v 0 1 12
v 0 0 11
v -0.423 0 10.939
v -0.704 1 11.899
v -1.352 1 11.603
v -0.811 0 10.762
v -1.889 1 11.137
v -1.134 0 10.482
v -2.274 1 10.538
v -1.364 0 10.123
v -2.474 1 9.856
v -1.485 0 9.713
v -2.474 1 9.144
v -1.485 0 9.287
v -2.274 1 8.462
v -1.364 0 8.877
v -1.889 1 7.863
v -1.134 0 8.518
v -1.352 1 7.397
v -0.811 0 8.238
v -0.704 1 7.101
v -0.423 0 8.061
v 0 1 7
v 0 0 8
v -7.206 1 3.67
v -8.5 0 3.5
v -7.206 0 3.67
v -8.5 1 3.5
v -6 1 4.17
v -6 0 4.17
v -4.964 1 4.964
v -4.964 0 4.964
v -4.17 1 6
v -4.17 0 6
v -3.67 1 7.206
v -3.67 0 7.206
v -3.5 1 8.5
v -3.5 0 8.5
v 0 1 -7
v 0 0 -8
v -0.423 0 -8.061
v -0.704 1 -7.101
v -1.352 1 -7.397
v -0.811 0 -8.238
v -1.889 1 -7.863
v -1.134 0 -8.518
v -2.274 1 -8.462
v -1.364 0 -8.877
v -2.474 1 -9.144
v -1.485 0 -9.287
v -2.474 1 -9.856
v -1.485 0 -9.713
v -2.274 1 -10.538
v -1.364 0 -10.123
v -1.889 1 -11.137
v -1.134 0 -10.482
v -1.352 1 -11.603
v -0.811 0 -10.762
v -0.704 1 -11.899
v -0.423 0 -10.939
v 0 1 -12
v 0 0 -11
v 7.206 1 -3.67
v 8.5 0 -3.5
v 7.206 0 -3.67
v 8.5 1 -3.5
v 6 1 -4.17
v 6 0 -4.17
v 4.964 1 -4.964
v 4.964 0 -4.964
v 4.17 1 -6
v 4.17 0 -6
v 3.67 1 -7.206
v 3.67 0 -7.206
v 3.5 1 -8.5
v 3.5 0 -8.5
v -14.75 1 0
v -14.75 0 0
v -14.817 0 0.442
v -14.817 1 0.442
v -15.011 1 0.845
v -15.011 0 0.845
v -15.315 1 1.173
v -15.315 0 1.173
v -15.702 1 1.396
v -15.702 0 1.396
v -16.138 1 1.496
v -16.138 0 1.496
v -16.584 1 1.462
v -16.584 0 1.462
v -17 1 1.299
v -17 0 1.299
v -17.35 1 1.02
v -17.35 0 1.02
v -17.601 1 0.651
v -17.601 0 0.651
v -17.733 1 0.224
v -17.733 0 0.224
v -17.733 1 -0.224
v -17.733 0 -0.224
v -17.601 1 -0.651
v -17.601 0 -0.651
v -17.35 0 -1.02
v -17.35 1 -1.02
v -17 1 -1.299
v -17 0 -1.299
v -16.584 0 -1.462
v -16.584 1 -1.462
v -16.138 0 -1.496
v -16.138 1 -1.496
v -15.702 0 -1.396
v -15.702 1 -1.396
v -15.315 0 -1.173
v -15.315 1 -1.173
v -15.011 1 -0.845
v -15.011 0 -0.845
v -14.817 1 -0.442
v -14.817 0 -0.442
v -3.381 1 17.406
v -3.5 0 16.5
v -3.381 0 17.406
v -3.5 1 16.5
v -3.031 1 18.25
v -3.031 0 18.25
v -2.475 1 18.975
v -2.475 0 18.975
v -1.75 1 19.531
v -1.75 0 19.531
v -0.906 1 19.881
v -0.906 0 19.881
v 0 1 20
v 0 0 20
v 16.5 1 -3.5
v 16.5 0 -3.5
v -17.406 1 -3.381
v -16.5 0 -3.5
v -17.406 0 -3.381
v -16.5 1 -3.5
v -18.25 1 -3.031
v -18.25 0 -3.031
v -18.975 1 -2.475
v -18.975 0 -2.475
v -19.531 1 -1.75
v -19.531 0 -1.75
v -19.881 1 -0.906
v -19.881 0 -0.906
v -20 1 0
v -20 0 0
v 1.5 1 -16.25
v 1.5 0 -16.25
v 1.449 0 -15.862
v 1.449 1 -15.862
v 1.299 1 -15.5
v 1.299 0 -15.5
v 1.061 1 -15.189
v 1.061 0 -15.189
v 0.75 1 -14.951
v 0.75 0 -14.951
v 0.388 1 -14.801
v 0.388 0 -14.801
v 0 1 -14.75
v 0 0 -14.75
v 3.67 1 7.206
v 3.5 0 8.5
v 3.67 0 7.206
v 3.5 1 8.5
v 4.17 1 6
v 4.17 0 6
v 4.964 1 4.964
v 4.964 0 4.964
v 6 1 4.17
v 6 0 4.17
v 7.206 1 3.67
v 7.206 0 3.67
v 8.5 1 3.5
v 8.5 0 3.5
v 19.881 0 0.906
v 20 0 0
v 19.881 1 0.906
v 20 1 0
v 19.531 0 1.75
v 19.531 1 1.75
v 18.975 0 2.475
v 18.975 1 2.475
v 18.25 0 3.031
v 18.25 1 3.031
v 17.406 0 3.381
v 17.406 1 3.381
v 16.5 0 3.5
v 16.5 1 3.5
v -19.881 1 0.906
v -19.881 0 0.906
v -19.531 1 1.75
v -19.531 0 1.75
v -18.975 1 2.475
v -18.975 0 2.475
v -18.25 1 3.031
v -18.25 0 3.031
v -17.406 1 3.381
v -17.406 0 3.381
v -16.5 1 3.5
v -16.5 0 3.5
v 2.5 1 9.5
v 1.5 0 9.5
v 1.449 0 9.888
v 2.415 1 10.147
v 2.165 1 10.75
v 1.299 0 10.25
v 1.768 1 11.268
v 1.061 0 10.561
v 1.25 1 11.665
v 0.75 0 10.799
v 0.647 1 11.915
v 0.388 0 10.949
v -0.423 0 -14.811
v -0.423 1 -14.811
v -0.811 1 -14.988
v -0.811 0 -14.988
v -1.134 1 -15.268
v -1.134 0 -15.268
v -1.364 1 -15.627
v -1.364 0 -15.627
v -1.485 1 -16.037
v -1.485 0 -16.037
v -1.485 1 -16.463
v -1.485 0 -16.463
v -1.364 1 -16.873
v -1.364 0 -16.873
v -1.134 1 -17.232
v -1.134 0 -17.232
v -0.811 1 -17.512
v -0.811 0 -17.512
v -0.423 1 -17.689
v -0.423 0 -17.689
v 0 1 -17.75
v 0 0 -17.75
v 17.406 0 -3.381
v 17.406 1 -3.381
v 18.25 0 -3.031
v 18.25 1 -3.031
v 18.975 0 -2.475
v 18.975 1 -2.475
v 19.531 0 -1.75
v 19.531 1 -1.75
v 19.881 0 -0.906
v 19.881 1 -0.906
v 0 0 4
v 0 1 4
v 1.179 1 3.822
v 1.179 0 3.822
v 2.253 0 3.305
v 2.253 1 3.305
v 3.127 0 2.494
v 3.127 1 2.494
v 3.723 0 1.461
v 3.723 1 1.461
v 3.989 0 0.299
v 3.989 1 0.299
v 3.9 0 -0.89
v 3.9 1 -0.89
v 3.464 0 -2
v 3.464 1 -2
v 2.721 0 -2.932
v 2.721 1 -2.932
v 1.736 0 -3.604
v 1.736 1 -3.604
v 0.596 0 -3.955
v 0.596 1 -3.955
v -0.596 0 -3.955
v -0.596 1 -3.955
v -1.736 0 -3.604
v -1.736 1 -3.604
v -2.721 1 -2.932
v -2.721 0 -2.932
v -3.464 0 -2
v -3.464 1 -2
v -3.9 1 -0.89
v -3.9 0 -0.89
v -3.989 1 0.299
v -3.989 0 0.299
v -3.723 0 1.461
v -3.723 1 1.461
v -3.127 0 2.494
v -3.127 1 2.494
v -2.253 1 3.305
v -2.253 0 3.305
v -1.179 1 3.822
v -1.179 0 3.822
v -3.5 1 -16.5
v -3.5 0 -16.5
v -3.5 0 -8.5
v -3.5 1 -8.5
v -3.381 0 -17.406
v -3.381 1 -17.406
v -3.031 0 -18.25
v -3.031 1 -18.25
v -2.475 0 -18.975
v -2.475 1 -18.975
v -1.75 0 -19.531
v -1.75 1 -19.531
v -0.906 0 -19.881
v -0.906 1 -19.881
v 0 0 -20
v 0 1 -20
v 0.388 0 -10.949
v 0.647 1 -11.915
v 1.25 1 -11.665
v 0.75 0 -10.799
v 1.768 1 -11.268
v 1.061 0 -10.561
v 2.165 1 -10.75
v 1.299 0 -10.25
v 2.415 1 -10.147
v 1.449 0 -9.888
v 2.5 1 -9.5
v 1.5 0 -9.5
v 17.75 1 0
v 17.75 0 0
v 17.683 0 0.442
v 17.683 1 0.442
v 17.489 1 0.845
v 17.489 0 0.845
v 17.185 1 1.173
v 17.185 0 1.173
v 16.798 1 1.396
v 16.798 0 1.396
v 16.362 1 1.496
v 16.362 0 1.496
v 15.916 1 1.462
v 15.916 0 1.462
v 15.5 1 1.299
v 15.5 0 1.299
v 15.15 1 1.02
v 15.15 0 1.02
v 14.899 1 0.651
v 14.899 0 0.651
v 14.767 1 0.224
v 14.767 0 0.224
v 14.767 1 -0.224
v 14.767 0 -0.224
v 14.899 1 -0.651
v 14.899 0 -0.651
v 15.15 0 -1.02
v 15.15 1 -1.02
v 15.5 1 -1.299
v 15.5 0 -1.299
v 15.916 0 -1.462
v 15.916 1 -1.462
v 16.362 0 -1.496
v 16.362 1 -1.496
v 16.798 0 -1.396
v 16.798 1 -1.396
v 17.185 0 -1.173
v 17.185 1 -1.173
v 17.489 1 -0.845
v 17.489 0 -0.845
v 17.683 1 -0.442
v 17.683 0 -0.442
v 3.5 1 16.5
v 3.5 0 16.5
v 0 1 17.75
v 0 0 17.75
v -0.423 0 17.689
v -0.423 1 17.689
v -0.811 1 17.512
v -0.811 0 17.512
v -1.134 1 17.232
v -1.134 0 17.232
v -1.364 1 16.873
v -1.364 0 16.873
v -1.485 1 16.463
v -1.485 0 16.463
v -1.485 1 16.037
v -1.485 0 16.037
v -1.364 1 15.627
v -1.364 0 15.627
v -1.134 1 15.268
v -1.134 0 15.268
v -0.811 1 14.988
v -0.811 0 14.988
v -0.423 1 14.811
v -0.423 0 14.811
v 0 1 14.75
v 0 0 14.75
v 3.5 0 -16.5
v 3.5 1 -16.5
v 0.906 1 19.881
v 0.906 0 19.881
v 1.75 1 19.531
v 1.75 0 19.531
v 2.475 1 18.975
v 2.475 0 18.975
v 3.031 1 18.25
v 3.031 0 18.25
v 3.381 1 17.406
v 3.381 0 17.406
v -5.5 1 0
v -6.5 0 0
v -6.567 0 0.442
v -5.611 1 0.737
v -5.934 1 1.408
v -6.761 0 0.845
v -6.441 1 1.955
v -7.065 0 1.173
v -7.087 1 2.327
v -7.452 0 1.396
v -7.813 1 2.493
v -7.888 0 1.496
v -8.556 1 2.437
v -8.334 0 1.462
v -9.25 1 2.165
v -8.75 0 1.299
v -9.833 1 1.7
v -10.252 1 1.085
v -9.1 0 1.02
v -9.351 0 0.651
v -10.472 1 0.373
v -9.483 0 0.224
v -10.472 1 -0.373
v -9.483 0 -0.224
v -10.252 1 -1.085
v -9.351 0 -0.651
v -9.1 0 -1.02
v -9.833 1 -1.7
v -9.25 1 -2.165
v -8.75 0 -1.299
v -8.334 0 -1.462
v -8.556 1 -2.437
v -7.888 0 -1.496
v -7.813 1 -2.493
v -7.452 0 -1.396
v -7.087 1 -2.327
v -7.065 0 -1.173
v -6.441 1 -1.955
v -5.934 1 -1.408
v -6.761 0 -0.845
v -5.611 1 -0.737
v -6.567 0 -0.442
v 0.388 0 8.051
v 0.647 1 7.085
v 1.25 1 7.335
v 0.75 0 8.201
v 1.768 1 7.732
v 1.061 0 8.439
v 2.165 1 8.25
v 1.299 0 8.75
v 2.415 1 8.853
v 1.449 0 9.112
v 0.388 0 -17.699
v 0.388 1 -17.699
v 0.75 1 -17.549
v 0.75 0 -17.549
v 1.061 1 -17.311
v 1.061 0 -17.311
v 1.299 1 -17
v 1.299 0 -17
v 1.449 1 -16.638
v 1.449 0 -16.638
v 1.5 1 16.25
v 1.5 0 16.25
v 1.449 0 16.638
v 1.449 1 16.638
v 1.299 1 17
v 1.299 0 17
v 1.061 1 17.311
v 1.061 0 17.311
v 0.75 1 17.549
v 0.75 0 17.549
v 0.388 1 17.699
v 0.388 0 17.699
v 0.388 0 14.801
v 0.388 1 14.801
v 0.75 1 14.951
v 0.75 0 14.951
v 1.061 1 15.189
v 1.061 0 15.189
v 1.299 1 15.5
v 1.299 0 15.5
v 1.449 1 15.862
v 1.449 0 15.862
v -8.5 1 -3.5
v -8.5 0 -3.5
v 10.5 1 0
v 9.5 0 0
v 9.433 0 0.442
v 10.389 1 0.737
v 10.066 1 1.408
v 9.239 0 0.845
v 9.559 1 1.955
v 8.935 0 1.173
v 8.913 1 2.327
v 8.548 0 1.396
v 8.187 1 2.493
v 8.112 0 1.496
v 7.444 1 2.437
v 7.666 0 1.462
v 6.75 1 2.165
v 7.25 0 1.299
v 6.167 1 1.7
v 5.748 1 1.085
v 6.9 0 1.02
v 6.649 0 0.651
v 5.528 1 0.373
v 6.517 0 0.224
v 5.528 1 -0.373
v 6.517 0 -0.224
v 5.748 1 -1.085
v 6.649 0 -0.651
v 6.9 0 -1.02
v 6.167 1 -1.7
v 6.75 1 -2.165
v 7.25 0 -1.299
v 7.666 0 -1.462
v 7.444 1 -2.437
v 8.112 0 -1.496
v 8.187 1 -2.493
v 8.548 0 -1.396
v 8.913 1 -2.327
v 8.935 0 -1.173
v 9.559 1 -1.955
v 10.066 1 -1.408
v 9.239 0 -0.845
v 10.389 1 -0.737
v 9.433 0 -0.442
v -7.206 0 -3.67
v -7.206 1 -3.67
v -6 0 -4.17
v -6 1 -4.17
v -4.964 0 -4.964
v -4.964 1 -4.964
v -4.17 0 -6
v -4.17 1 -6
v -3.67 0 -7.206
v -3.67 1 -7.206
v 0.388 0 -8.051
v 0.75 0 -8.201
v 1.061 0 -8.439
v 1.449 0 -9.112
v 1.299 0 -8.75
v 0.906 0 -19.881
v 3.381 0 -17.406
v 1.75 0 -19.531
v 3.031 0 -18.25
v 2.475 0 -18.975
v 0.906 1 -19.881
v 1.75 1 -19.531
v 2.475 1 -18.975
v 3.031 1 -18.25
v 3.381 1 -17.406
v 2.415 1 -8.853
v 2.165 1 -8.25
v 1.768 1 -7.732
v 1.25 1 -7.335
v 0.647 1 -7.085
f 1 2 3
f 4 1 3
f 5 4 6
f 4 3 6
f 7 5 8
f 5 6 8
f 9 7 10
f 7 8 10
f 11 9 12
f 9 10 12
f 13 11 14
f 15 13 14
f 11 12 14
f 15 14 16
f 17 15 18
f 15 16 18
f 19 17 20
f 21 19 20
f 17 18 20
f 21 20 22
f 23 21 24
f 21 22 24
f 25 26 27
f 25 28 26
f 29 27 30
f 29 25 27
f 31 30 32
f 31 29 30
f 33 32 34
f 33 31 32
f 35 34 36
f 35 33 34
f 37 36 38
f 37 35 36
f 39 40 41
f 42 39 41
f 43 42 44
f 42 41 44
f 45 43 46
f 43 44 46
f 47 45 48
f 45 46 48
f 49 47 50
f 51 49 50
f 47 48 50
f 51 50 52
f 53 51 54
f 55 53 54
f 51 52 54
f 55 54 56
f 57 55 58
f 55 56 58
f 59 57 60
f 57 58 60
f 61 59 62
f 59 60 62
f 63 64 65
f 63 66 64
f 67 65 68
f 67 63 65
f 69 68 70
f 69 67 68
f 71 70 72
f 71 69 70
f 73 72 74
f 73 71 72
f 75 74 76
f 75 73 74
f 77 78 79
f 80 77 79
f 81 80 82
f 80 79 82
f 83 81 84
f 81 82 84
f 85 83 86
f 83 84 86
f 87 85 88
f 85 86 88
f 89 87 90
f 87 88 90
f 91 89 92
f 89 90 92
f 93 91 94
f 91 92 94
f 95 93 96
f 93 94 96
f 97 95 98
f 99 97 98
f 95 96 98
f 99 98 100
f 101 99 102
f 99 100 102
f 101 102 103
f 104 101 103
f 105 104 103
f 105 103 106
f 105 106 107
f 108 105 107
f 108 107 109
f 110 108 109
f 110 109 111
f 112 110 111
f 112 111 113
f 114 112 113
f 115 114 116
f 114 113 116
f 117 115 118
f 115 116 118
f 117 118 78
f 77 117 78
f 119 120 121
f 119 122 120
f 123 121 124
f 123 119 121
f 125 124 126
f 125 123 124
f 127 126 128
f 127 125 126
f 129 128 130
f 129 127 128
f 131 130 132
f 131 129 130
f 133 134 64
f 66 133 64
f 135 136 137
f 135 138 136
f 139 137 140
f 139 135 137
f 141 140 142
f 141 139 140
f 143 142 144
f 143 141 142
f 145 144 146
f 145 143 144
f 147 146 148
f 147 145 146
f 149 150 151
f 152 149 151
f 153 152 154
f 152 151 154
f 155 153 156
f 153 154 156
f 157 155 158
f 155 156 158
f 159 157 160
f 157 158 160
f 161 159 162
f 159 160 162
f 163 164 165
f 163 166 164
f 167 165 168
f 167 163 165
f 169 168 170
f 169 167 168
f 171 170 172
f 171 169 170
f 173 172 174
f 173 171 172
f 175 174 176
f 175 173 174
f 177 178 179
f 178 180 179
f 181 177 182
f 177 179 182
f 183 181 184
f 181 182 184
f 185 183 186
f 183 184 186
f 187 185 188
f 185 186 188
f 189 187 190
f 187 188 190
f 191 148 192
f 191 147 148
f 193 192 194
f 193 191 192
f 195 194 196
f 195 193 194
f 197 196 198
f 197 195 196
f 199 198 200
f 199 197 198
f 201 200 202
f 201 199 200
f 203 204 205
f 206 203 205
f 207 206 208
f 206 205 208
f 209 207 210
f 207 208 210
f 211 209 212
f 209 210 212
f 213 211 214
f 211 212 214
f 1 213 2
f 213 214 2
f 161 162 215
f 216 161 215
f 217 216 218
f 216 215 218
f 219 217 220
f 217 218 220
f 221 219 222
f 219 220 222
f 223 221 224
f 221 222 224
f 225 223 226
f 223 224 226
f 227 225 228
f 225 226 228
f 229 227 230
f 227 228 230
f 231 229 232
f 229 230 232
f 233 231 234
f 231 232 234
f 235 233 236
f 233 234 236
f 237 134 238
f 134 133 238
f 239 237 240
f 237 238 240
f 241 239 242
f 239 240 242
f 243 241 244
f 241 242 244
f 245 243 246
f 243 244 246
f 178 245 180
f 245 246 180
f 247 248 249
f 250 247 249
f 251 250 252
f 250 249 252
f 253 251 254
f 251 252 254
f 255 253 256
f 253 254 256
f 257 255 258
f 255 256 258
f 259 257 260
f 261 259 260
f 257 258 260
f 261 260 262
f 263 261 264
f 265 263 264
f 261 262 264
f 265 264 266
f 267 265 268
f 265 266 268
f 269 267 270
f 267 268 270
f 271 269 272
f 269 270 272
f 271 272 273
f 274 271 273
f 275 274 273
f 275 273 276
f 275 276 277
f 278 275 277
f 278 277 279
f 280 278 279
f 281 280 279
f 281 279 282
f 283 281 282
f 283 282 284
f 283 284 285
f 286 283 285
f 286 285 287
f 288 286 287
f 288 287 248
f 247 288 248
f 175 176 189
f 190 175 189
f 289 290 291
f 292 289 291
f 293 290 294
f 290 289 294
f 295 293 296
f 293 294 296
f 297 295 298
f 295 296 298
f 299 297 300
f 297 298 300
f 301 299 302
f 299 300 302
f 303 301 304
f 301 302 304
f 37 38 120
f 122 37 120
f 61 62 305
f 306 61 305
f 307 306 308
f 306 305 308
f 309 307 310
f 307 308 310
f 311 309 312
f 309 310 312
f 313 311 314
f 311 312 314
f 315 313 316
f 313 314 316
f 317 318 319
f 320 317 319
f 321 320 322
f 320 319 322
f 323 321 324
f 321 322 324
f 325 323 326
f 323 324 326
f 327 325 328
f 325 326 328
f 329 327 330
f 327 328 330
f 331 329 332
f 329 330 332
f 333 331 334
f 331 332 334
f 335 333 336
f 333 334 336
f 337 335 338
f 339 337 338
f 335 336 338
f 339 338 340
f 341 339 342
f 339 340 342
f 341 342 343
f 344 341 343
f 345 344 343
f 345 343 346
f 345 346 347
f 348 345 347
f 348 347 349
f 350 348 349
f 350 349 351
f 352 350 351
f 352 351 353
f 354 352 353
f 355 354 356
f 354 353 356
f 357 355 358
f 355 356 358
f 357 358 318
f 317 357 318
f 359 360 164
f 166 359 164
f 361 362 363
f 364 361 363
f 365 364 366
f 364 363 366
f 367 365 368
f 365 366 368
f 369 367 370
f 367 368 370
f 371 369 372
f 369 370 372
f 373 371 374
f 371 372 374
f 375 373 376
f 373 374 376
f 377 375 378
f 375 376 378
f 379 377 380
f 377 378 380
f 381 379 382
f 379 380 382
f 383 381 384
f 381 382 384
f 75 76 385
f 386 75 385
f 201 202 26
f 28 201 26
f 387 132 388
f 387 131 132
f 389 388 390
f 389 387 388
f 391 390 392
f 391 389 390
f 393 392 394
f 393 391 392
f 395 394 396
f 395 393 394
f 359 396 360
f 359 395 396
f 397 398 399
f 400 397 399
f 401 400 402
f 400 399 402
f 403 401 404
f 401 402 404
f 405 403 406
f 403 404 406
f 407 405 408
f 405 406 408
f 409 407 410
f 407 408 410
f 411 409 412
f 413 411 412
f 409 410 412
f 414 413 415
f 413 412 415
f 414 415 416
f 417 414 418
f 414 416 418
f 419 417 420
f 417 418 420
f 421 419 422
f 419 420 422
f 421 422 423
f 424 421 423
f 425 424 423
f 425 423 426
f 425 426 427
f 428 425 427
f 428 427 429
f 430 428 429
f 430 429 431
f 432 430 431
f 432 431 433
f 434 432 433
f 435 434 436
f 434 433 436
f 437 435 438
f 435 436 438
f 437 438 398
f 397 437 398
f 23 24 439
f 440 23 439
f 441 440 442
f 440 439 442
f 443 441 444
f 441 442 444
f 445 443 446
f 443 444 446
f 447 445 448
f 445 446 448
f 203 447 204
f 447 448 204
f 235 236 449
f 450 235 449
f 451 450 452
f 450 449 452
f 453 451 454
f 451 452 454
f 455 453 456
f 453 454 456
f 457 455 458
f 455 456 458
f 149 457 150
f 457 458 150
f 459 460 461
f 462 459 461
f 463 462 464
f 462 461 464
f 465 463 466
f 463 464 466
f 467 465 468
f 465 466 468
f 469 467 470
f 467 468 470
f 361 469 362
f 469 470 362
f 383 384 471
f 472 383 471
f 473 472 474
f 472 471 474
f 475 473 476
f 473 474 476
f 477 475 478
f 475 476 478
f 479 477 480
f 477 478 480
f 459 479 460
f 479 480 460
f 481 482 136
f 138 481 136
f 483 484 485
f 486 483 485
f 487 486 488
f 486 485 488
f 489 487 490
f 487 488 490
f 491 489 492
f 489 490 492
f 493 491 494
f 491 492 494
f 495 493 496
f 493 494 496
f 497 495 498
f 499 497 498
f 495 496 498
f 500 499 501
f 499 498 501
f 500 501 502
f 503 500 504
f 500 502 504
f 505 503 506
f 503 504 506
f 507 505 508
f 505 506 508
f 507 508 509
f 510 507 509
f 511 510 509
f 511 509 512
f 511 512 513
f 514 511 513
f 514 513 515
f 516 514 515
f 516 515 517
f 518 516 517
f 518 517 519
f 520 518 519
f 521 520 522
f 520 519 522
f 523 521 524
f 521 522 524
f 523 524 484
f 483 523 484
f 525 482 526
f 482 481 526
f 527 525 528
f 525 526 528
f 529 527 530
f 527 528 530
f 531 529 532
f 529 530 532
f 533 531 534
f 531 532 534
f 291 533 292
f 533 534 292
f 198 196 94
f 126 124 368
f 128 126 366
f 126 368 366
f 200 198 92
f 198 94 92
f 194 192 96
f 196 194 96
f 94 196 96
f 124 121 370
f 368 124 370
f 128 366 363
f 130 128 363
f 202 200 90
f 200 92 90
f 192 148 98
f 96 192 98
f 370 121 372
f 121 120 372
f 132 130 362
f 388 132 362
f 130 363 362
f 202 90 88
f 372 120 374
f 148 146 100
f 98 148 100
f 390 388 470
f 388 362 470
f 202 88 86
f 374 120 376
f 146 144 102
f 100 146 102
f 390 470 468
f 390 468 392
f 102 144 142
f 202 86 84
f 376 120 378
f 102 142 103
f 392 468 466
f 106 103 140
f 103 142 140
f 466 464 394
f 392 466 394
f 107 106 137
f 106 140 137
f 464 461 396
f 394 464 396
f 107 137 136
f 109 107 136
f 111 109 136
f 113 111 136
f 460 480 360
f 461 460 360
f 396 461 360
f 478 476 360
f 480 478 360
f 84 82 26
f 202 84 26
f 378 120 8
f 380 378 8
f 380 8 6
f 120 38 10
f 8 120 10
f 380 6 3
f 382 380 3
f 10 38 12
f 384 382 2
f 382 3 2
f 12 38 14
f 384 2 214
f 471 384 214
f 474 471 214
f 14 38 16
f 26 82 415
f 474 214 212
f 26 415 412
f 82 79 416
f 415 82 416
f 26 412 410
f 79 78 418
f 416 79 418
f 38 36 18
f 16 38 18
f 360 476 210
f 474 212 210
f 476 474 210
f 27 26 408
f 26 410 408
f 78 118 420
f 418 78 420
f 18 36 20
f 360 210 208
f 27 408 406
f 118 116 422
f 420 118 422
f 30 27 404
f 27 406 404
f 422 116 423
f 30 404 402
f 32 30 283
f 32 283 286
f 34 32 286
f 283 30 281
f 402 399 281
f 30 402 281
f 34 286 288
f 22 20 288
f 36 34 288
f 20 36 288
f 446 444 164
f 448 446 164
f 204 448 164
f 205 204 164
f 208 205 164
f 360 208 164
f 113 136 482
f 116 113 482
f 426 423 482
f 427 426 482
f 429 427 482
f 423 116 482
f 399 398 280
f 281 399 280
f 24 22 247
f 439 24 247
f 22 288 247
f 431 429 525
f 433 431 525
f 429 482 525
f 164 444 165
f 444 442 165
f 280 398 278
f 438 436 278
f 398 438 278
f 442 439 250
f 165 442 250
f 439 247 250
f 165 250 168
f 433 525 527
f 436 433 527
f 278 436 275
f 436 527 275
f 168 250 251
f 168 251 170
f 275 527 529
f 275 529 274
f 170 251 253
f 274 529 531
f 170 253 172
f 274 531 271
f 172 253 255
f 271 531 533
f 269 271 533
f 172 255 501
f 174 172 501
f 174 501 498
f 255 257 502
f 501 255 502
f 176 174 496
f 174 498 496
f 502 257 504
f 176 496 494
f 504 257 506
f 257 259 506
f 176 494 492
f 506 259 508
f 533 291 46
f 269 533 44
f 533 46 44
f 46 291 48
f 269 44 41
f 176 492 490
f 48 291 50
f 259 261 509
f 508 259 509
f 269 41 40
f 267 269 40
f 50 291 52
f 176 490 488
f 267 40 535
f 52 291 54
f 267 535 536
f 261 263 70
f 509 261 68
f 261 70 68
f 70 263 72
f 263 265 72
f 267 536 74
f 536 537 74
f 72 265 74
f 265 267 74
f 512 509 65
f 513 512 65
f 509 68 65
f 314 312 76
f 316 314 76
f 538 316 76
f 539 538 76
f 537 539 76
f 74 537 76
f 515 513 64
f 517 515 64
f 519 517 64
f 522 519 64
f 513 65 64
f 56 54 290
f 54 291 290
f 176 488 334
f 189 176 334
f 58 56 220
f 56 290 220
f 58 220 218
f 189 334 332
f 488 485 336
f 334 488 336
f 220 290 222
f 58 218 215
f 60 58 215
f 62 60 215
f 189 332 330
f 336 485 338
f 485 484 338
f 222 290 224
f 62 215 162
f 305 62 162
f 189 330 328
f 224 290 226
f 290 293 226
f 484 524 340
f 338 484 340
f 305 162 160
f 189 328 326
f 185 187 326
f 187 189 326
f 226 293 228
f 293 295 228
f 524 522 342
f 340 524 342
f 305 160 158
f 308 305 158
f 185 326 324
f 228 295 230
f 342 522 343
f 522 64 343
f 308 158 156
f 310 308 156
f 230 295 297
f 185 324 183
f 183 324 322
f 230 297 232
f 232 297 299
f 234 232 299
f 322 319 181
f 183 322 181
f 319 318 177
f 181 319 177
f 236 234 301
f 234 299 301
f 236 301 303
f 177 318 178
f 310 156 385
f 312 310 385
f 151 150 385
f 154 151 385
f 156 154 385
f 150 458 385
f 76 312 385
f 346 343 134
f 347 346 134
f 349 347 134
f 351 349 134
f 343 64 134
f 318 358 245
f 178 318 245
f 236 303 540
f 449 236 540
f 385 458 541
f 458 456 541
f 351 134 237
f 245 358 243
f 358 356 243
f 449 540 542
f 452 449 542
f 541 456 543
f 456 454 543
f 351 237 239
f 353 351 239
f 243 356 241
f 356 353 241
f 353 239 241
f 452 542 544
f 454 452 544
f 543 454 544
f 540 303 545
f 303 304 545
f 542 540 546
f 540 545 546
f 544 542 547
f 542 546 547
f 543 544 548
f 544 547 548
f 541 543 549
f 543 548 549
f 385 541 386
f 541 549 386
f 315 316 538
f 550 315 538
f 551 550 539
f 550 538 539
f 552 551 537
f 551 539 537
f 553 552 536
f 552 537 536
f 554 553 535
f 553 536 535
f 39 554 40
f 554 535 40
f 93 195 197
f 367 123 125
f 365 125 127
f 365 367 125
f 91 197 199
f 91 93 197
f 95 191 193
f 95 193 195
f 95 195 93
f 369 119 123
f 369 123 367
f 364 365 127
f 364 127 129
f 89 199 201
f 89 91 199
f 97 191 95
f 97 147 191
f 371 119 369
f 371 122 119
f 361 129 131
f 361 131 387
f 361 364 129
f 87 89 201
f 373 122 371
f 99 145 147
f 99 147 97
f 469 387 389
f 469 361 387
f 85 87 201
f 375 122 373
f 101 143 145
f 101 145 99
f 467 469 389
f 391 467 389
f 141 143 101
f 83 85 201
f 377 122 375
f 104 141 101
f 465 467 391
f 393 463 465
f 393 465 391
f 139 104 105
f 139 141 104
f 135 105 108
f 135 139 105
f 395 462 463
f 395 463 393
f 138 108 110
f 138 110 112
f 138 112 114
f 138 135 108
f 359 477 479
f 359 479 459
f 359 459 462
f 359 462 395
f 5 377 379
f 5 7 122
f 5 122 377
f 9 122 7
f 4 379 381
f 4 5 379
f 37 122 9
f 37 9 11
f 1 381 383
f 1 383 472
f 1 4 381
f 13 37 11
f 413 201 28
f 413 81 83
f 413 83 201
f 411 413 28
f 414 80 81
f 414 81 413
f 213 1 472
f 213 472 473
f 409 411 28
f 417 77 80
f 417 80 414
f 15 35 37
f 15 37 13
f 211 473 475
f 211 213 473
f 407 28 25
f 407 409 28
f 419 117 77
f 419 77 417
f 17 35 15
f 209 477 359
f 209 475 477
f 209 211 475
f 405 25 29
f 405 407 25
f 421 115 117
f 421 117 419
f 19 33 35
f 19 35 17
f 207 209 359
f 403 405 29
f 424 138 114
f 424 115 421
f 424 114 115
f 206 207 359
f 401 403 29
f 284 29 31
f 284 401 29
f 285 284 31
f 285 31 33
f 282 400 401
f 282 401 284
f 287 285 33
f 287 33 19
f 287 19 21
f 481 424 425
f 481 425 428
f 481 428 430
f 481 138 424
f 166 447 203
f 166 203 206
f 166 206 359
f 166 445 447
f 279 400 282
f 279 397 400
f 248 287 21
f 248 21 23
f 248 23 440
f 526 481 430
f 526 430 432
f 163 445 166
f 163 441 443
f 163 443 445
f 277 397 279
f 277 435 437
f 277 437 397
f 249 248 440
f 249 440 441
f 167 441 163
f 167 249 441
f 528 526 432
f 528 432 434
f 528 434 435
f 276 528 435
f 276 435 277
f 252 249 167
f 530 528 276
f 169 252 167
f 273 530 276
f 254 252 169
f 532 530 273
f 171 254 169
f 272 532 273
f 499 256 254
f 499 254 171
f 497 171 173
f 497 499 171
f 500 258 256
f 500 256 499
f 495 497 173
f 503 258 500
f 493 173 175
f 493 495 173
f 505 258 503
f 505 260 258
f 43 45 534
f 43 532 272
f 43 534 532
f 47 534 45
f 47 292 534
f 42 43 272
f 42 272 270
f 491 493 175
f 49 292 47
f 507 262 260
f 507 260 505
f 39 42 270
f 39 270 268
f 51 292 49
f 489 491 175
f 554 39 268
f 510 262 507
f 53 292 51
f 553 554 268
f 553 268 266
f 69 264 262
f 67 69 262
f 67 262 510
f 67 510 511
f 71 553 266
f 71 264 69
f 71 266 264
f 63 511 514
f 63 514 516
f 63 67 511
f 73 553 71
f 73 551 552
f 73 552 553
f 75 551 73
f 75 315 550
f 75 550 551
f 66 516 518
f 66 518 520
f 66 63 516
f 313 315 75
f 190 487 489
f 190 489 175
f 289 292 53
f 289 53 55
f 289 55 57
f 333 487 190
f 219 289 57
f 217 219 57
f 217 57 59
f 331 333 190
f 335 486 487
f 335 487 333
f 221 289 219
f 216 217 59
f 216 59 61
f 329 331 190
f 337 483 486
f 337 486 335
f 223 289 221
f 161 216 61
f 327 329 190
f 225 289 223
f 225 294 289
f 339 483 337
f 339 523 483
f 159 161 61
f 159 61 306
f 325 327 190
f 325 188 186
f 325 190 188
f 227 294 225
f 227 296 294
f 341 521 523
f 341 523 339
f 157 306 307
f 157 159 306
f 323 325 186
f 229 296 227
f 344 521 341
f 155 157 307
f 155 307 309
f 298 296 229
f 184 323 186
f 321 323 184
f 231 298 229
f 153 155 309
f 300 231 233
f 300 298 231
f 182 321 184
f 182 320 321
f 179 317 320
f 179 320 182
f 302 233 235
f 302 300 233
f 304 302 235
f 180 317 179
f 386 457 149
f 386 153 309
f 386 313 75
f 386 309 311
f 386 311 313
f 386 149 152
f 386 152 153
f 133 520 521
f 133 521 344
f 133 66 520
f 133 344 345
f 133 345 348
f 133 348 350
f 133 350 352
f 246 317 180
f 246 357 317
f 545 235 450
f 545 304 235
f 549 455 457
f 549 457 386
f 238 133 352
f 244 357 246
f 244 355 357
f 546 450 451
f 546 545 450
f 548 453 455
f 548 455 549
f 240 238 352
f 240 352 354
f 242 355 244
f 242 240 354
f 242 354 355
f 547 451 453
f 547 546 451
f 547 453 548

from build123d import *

# Parameters (mm, degrees)
SKETCH1_W           = 3.5
SKETCH1_H           = 3.5
BOSS_EXTRUDE1_DEPTH = 1
FILLET1_R           = 5
FILLET2_R           = 3.5
CUT_EXTRUDE1_REACH  = 30.302
SKETCH2_R           = 4
CHAMFER1_SIZE       = 1


with BuildPart() as part:
    # Sketch1 → Boss-Extrude1 (new body)
    with BuildSketch(Plane(origin=(0, 0, 0), x_dir=(1, 0, 0), z_dir=(0, 1, 0))):
        with BuildLine():
            Line((-6.5, 0), (-3.5, 0))
            Line((-3.5, 0), (-3.5, 3.5))
            Line((-3.5, 3.5), (-20, 3.5))
            Line((-20, 3.5), (-20, 0))
            Line((-20, 0), (-17.75, 0))
            ThreePointArc((-17.75, 0), (-16.25, 1.5), (-14.75, 0))
            Line((-14.75, 0), (-9.5, 0))
            ThreePointArc((-9.5, 0), (-8, 1.5), (-6.5, 0))
        make_face()
        with BuildLine():
            Line((-20, -3.5), (-3.5, -3.5))
            Line((-3.5, -3.5), (-3.5, 0))
            Line((-3.5, 0), (-6.5, 0))
            ThreePointArc((-6.5, 0), (-8, -1.5), (-9.5, 0))
            Line((-9.5, 0), (-14.75, 0))
            ThreePointArc((-14.75, 0), (-16.25, -1.5), (-17.75, 0))
            Line((-17.75, 0), (-20, 0))
            Line((-20, 0), (-20, -3.5))
        make_face()
        with BuildLine():
            Line((-3.5, 20), (-3.5, 3.5))
            Line((-3.5, 3.5), (0, 3.5))
            Line((0, 3.5), (0, 8))
            ThreePointArc((0, 8), (-1.5, 9.5), (0, 11))
            Line((0, 11), (0, 14.75))
            ThreePointArc((0, 14.75), (-1.5, 16.25), (0, 17.75))
            Line((0, 17.75), (0, 20))
            Line((0, 20), (-3.5, 20))
        make_face()
        with BuildLine():
            Line((0, 3.5), (3.5, 3.5))
            Line((3.5, 3.5), (3.5, 20))
            Line((3.5, 20), (0, 20))
            Line((0, 20), (0, 17.75))
            ThreePointArc((0, 17.75), (1.060660172, 17.310660172), (1.5, 16.25))
            ThreePointArc((1.5, 16.25), (1.060660172, 15.189339828), (0, 14.75))
            Line((0, 14.75), (0, 11))
            ThreePointArc((0, 11), (1.060660172, 10.560660172), (1.5, 9.5))
            ThreePointArc((1.5, 9.5), (1.060660172, 8.439339828), (0, 8))
            Line((0, 8), (0, 3.5))
        make_face()
        with BuildLine():
            Line((3.5, 3.5), (3.5, 0))
            Line((3.5, 0), (6.5, 0))
            ThreePointArc((6.5, 0), (8, 1.5), (9.5, 0))
            Line((9.5, 0), (14.75, 0))
            ThreePointArc((14.75, 0), (16.25, 1.5), (17.75, 0))
            Line((17.75, 0), (20, 0))
            Line((20, 0), (20, 3.5))
            Line((20, 3.5), (3.5, 3.5))
        make_face()
        with Locations((-1.75, 1.75)):
            Rectangle(SKETCH1_W, SKETCH1_H)
        with Locations((-1.75, -1.75)):
            Rectangle(SKETCH1_W, SKETCH1_H)
        with Locations((1.75, -1.75)):
            Rectangle(SKETCH1_W, SKETCH1_H)
        with Locations((1.75, 1.75)):
            Rectangle(SKETCH1_W, SKETCH1_H)
        with BuildLine():
            Line((-3.5, -20), (0, -20))
            Line((0, -20), (0, -17.75))
            ThreePointArc((0, -17.75), (-1.5, -16.25), (0, -14.75))
            Line((0, -14.75), (0, -11))
            ThreePointArc((0, -11), (-1.5, -9.5), (0, -8))
            Line((0, -8), (0, -3.5))
            Line((0, -3.5), (-3.5, -3.5))
            Line((-3.5, -3.5), (-3.5, -20))
        make_face()
        with BuildLine():
            Line((0, -17.75), (0, -20))
            Line((0, -20), (3.5, -20))
            Line((3.5, -20), (3.5, -3.5))
            Line((3.5, -3.5), (0, -3.5))
            Line((0, -3.5), (0, -8))
            ThreePointArc((0, -8), (1.060660172, -8.439339828), (1.5, -9.5))
            ThreePointArc((1.5, -9.5), (1.060660172, -10.560660172), (0, -11))
            Line((0, -11), (0, -14.75))
            ThreePointArc((0, -14.75), (1.060660172, -15.189339828), (1.5, -16.25))
            ThreePointArc((1.5, -16.25), (1.060660172, -17.310660172), (0, -17.75))
        make_face()
        with BuildLine():
            Line((3.5, 0), (3.5, -3.5))
            Line((3.5, -3.5), (20, -3.5))
            Line((20, -3.5), (20, 0))
            Line((20, 0), (17.75, 0))
            ThreePointArc((17.75, 0), (16.25, -1.5), (14.75, 0))
            Line((14.75, 0), (9.5, 0))
            ThreePointArc((9.5, 0), (8, -1.5), (6.5, 0))
            Line((6.5, 0), (3.5, 0))
        make_face()
    extrude(amount=BOSS_EXTRUDE1_DEPTH)

    # Fillet1
    fillet1_edges = [part.edges().sort_by_distance(p)[0] for p in [
        (-3.5, 0.5, -3.5),
        (3.5, 0.5, -3.5),
        (3.5, 0.5, 3.5),
        (-3.5, 0.5, 3.5),
    ]]
    fillet(fillet1_edges, radius=FILLET1_R)

    # Fillet2
    fillet2_edges = [part.edges().sort_by_distance(p)[0] for p in [
        (20, 0.5, 3.5),
        (20, 0.5, -3.5),
        (3.5, 0.5, -20),
        (-3.5, 0.5, -20),
        (-20, 0.5, -3.5),
        (-20, 0.5, 3.5),
        (3.5, 0.5, 20),
        (-3.5, 0.5, 20),
    ]]
    fillet(fillet2_edges, radius=FILLET2_R - 0.0001)  # a hair under: the kernel refuses the full size

    # Sketch2 → Cut-Extrude1 (cut, up to next)
    with BuildSketch(Plane(origin=(0, 1, 0), x_dir=(1, 0, 0), z_dir=(0, 1, 0)), mode=Mode.PRIVATE) as cut_extrude1_sk1:
        with Locations(Location((0, 0, 0), (0, 0, 270))):
            Circle(SKETCH2_R)
    cut_extrude1_tool1 = extrude(cut_extrude1_sk1.sketch, amount=-CUT_EXTRUDE1_REACH, mode=Mode.PRIVATE) & part.part
    add(cut_extrude1_tool1.solids().sort_by_distance((0, 1, 0))[0], mode=Mode.SUBTRACT)

    # Chamfer1
    chamfer1_edges = [part.edges().sort_by_distance(p)[0] for p in [
        (0, 1, 11),
        (6.5, 1, 0),
        (-6.5, 1, 0),
        (0, 1, -11),
    ]]
    chamfer(chamfer1_edges, length=CHAMFER1_SIZE - 0.0001)  # a hair under: the kernel refuses the full size


solid = part.part
